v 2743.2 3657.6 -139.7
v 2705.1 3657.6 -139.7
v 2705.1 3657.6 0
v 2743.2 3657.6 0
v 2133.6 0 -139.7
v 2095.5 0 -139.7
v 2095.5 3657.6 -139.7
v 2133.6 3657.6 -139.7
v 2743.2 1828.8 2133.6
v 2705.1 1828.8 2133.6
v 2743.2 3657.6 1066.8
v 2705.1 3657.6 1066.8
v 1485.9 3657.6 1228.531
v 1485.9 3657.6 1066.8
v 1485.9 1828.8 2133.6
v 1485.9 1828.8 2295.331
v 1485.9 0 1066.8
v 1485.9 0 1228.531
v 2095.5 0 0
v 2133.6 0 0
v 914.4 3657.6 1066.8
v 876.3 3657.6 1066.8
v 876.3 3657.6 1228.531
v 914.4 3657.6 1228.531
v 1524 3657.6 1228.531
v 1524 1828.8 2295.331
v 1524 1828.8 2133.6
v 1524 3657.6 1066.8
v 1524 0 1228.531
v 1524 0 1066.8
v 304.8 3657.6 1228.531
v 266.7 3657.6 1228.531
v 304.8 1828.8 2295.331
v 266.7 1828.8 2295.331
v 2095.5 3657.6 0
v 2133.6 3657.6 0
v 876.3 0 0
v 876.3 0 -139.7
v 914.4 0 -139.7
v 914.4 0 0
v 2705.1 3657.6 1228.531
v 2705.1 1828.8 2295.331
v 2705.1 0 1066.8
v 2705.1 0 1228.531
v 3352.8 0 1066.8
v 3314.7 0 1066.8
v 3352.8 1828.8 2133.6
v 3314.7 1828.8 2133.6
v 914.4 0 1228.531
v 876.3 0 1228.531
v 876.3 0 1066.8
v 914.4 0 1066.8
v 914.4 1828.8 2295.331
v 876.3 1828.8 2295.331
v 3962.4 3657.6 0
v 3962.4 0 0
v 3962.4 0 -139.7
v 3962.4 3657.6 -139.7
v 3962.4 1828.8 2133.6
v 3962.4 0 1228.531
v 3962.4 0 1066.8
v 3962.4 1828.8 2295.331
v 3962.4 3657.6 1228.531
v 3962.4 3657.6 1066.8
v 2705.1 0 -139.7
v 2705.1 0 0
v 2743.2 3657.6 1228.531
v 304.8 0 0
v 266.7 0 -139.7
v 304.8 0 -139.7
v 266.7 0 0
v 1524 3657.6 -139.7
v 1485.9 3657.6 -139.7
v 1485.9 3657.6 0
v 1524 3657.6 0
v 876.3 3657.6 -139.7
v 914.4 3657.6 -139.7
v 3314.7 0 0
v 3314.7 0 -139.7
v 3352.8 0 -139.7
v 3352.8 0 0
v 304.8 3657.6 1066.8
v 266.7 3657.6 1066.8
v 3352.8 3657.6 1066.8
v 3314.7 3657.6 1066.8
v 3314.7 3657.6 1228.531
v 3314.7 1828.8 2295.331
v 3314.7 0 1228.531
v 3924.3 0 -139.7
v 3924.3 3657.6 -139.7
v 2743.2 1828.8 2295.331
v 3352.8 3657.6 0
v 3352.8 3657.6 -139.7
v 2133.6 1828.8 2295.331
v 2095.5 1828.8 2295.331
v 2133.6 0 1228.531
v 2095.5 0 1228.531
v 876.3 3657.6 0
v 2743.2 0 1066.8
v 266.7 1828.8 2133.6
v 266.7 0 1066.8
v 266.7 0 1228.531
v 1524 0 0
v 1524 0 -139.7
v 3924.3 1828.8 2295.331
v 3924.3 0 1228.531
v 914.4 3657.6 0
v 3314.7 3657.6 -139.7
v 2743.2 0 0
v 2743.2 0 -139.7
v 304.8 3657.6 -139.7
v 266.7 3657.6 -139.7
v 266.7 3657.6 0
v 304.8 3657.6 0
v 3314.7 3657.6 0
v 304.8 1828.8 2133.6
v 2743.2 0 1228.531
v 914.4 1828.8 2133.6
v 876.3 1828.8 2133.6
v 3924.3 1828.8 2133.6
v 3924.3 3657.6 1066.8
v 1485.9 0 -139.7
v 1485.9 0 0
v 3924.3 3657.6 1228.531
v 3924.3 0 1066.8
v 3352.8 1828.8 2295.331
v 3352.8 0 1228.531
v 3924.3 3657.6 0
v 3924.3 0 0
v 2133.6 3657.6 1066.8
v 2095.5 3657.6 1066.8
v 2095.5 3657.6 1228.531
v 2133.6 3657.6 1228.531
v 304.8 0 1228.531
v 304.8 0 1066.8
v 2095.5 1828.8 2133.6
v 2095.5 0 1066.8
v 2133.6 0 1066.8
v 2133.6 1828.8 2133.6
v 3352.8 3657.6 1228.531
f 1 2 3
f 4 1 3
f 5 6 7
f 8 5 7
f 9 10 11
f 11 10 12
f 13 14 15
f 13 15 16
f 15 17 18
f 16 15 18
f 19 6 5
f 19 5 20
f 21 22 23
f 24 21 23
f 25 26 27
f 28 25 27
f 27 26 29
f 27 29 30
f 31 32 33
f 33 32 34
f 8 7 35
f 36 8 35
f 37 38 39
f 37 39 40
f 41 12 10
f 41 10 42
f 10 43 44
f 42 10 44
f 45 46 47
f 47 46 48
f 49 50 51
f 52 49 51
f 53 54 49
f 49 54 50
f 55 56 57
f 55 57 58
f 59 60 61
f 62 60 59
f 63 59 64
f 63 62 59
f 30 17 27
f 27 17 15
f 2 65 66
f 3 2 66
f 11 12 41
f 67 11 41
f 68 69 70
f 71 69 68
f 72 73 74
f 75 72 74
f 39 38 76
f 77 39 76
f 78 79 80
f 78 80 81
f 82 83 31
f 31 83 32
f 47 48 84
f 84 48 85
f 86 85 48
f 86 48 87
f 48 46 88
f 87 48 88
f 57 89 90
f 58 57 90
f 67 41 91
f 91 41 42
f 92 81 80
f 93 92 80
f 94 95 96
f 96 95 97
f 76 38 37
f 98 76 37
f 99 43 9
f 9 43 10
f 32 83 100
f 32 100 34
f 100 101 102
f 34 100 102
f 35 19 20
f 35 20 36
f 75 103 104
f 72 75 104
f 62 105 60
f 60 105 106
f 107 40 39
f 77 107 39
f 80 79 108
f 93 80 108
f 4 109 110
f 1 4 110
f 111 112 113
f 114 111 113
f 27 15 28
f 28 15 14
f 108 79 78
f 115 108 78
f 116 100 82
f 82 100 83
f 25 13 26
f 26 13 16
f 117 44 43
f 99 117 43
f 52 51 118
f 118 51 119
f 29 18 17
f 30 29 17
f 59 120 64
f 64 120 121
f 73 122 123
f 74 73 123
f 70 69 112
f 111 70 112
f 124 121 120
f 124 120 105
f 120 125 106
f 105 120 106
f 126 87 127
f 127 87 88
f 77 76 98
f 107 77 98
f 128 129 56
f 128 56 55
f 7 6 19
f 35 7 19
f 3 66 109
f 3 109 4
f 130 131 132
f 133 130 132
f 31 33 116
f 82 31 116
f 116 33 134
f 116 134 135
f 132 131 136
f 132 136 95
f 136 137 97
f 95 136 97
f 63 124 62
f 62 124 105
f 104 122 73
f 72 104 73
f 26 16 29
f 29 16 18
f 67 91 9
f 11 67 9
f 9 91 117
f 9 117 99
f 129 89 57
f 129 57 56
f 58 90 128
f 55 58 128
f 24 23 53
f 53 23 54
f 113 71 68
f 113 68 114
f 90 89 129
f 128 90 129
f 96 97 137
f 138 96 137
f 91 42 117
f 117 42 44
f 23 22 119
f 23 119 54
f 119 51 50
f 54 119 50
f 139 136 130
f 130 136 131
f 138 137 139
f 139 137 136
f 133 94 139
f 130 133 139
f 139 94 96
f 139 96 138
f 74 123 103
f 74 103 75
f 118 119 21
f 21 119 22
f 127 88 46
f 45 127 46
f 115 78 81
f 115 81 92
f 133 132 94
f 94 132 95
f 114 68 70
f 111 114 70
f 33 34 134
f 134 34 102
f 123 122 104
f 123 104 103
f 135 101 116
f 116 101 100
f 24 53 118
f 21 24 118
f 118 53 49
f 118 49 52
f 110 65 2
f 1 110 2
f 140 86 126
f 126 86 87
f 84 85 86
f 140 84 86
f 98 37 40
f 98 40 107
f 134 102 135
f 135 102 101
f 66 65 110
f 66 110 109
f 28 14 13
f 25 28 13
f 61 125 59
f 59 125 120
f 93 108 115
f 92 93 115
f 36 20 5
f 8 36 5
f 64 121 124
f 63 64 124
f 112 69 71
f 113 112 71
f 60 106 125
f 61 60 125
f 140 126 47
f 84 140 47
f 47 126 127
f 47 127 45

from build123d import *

# Parameters (mm, degrees)
F0_W     = 3657.6
F0_H     = 139.7
F1_DEPTH = 3962.4
F2_W     = 266.7
F2_H     = 1206.5
F2_W_2   = 571.5
F2_H_2   = 161.7312021105
F2_H_3   = 1066.8
F3_DEPTH = 3657.601


with BuildPart() as f1:
    # F0 (on Right) → F1 (new body)
    with BuildSketch(Plane.YZ):
        with Locations((1828.8, -69.85)):
            Rectangle(F0_W, F0_H)
    extrude(amount=F1_DEPTH)


with BuildPart() as f1b:
    # F0 (on Right) → F1, piece 2 (new body)
    with BuildSketch(Plane.YZ):
        Polygon((0, 1228.5312021105), (0, 1066.8), (1828.8, 2133.6), (3657.6, 1066.8), (3657.6, 1228.5312021105), (1828.8, 2295.3312021105), align=None)
    extrude(amount=F1_DEPTH)


with BuildPart() as f3_tool:
    # F2 (on face) → F3 (new body, through all)
    with BuildSketch(Plane.XZ):
        with Locations((133.35, 463.55)):
            Rectangle(F2_W, F2_H)
        with Locations((1200.15, 463.55)):
            Rectangle(F2_W_2, F2_H)
        with Locations((1809.75, 463.55)):
            Rectangle(F2_W_2, F2_H)
        with Locations((2419.35, 463.55)):
            Rectangle(F2_W_2, F2_H)
        with Locations((3028.95, 463.55)):
            Rectangle(F2_W_2, F2_H)
        with Locations((3638.55, 463.55)):
            Rectangle(F2_W_2, F2_H)
        with Locations((3638.55, 1147.6656010553)):
            Rectangle(F2_W_2, F2_H_2)
        with Locations((3028.95, 1147.6656010553)):
            Rectangle(F2_W_2, F2_H_2)
        with Locations((2419.35, 1147.6656010553)):
            Rectangle(F2_W_2, F2_H_2)
        with Locations((1809.75, 1147.6656010553)):
            Rectangle(F2_W_2, F2_H_2)
        with Locations((133.35, 1147.6656010553)):
            Rectangle(F2_W, F2_H_2)
        with Locations((590.55, 1147.6656010553)):
            Rectangle(F2_W_2, F2_H_2)
        with Locations((1200.15, 1147.6656010553)):
            Rectangle(F2_W_2, F2_H_2)
        with Locations((133.35, 1761.9312021105)):
            Rectangle(F2_W, F2_H_3)
        with Locations((590.55, 1761.9312021105)):
            Rectangle(F2_W_2, F2_H_3)
        with Locations((1200.15, 1761.9312021105)):
            Rectangle(F2_W_2, F2_H_3)
        with Locations((1809.75, 1761.9312021105)):
            Rectangle(F2_W_2, F2_H_3)
        with Locations((2419.35, 1761.9312021105)):
            Rectangle(F2_W_2, F2_H_3)
        with Locations((3028.95, 1761.9312021105)):
            Rectangle(F2_W_2, F2_H_3)
        with Locations((3638.55, 1761.9312021105)):
            Rectangle(F2_W_2, F2_H_3)
        with Locations((590.55, 463.55)):
            Rectangle(F2_W_2, F2_H)
    extrude(amount=-F3_DEPTH)


with BuildPart() as f1_1:
    add(f1.part)

    # F3: cut by f3_tool
    add(f3_tool.part, mode=Mode.SUBTRACT)


with BuildPart() as f1b_1:
    add(f1b.part)

    # F3: cut by f3_tool
    add(f3_tool.part, mode=Mode.SUBTRACT)


solid = Compound([f1_1.part, f1b_1.part])
